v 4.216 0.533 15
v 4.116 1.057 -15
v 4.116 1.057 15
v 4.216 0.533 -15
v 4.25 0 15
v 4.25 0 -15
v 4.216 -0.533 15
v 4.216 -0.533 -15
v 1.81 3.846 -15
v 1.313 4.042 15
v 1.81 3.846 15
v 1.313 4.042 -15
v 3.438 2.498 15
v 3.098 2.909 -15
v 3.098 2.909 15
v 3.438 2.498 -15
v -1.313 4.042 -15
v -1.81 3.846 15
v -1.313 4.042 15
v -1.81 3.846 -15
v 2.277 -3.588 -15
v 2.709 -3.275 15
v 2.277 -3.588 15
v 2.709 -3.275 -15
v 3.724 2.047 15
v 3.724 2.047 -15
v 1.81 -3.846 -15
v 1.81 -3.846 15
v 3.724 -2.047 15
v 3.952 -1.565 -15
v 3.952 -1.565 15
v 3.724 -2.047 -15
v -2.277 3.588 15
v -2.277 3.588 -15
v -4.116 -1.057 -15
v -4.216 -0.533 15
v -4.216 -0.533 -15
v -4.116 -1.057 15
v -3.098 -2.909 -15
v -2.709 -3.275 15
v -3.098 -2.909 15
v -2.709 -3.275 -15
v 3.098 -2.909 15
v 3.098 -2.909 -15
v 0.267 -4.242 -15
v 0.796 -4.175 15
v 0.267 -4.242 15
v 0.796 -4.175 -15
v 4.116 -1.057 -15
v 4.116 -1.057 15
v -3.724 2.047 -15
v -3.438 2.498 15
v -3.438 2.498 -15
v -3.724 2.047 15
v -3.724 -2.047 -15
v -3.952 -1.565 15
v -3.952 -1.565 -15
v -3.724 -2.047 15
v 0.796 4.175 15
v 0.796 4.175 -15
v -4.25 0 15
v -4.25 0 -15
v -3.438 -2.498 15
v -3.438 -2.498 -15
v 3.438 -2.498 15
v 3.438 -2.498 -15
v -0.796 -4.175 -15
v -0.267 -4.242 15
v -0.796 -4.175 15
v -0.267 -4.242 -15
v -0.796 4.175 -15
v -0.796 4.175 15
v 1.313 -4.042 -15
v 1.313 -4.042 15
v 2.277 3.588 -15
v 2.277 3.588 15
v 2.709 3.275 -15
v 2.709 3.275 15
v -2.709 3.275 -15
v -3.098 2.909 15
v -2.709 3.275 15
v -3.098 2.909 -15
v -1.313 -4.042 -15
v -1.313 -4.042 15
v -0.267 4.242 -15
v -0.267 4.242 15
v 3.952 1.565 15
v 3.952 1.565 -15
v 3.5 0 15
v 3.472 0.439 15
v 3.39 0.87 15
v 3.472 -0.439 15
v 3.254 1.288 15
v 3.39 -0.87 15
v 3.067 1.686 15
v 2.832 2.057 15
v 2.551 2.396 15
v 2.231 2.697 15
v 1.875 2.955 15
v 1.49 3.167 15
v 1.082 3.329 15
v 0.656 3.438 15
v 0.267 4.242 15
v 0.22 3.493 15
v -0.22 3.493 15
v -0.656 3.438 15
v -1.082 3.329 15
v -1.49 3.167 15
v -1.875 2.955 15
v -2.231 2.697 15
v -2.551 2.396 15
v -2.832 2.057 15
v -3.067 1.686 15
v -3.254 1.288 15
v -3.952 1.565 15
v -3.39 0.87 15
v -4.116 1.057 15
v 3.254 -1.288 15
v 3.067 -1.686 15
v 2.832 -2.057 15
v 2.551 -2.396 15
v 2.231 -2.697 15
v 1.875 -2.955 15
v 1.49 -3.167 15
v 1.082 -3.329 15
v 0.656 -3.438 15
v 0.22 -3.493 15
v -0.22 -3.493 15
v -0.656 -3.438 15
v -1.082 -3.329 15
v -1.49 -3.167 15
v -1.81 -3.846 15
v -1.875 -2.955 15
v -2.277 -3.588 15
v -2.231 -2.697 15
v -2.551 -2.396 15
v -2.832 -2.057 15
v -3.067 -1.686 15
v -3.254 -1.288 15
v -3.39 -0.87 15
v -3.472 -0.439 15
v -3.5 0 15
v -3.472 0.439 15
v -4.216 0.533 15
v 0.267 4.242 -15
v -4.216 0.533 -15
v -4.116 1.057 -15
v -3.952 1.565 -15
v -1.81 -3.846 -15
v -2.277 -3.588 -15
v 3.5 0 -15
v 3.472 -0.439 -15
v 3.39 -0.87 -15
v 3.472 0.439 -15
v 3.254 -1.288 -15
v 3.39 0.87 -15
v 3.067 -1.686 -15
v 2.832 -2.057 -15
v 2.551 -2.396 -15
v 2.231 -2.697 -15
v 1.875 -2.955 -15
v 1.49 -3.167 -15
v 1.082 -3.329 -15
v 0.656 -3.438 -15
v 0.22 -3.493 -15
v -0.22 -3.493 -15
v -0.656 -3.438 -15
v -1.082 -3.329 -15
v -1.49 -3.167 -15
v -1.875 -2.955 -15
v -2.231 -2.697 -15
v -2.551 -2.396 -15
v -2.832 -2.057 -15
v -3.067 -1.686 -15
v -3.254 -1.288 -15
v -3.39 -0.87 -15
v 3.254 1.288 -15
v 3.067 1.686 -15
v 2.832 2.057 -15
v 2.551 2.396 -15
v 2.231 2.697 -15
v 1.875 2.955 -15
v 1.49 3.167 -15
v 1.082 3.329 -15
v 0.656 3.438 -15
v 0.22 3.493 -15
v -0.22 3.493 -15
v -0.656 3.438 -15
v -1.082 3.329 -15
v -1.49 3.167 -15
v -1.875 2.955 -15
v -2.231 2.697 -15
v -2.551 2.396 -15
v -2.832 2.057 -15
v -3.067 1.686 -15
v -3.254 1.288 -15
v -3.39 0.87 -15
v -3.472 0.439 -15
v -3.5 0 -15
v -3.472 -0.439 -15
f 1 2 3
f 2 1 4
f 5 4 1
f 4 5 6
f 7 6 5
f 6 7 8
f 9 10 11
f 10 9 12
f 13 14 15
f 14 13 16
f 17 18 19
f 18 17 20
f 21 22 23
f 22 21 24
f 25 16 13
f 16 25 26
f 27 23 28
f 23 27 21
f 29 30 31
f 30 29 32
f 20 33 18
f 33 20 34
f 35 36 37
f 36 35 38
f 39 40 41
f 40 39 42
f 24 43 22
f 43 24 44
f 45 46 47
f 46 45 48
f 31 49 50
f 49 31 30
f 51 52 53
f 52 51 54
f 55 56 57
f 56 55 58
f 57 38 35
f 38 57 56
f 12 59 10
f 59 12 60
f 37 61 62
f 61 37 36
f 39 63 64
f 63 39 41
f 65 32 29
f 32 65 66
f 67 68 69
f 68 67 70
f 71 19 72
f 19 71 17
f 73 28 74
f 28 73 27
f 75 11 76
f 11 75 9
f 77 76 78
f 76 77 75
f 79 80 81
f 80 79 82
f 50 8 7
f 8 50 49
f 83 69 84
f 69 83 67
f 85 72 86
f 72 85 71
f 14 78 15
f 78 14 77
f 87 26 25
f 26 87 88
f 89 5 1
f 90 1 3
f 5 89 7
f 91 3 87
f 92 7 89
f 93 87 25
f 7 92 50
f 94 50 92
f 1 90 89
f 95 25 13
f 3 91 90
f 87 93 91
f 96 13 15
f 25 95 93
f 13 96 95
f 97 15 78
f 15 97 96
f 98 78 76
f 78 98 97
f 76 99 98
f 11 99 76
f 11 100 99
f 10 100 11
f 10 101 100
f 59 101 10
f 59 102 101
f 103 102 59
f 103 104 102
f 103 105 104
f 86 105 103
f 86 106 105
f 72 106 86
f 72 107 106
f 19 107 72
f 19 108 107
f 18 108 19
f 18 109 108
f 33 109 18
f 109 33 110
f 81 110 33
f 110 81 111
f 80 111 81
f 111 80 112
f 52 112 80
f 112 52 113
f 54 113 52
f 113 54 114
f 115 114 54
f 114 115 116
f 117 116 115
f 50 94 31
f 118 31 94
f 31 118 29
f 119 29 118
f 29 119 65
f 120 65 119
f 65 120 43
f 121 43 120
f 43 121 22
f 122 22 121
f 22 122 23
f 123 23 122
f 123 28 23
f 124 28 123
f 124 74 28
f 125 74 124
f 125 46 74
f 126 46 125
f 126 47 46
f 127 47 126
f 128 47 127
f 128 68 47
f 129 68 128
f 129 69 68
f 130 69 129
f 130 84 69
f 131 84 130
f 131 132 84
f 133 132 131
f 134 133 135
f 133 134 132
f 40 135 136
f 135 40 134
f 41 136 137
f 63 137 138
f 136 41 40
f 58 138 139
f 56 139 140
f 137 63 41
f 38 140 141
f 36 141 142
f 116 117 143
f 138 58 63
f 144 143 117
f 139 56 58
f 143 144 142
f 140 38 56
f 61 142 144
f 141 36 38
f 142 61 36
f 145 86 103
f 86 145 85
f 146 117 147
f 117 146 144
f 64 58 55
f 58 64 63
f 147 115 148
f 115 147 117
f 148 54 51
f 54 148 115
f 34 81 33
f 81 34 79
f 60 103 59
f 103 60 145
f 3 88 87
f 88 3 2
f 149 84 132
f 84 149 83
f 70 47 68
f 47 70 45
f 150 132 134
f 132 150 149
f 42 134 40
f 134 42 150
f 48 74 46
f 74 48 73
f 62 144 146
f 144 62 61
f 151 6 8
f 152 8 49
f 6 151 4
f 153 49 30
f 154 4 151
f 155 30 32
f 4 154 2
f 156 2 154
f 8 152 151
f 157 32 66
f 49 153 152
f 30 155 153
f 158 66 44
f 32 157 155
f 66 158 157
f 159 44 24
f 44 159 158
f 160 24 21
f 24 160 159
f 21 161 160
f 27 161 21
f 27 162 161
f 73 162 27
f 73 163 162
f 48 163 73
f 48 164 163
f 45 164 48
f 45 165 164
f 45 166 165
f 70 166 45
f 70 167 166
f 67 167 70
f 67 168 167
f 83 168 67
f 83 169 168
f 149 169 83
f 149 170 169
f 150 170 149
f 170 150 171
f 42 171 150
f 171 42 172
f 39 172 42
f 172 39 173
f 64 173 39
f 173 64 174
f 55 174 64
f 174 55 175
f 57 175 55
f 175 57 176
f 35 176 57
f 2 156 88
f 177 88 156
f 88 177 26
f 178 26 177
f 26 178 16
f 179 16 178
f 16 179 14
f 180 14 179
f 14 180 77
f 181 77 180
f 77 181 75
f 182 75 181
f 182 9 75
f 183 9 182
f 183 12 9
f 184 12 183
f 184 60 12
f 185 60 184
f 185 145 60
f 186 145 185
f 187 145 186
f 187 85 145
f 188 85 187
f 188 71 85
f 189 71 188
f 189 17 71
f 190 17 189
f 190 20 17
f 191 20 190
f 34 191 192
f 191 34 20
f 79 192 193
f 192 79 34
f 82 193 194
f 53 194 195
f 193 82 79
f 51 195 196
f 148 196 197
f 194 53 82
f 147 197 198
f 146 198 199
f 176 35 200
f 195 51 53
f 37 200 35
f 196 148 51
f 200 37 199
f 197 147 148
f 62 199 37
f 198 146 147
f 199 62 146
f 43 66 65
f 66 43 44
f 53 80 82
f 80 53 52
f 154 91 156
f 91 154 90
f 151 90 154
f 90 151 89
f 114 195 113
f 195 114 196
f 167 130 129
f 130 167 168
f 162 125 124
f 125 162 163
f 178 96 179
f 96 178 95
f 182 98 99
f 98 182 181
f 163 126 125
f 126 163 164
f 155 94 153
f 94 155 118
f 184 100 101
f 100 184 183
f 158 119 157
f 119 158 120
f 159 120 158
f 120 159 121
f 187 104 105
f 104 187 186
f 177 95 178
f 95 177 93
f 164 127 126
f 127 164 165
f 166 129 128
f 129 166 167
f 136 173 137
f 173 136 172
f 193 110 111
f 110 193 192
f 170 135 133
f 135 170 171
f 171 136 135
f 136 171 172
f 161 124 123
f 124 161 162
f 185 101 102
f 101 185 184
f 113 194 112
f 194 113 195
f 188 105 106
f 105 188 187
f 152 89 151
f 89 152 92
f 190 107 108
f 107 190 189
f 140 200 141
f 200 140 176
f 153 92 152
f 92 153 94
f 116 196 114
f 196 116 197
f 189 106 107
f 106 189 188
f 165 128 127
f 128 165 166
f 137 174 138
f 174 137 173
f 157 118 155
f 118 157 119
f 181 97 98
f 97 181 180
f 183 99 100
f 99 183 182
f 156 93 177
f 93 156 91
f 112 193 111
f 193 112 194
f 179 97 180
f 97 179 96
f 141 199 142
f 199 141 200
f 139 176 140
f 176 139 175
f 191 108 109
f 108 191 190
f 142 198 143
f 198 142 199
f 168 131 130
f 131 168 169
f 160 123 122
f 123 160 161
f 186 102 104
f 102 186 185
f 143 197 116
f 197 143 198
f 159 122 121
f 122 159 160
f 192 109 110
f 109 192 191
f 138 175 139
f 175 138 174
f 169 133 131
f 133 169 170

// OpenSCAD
$fn = 50;


difference() {
	union() {
		translate(v = [0, 0, -15.0000000000]) {
			cylinder(h = 30, r = 4.2500000000);
		}
	}
	union() {
		translate(v = [0, 0, -100.0000000000]) {
			cylinder(h = 200, r = 3.5000000000);
		}
	}
}
